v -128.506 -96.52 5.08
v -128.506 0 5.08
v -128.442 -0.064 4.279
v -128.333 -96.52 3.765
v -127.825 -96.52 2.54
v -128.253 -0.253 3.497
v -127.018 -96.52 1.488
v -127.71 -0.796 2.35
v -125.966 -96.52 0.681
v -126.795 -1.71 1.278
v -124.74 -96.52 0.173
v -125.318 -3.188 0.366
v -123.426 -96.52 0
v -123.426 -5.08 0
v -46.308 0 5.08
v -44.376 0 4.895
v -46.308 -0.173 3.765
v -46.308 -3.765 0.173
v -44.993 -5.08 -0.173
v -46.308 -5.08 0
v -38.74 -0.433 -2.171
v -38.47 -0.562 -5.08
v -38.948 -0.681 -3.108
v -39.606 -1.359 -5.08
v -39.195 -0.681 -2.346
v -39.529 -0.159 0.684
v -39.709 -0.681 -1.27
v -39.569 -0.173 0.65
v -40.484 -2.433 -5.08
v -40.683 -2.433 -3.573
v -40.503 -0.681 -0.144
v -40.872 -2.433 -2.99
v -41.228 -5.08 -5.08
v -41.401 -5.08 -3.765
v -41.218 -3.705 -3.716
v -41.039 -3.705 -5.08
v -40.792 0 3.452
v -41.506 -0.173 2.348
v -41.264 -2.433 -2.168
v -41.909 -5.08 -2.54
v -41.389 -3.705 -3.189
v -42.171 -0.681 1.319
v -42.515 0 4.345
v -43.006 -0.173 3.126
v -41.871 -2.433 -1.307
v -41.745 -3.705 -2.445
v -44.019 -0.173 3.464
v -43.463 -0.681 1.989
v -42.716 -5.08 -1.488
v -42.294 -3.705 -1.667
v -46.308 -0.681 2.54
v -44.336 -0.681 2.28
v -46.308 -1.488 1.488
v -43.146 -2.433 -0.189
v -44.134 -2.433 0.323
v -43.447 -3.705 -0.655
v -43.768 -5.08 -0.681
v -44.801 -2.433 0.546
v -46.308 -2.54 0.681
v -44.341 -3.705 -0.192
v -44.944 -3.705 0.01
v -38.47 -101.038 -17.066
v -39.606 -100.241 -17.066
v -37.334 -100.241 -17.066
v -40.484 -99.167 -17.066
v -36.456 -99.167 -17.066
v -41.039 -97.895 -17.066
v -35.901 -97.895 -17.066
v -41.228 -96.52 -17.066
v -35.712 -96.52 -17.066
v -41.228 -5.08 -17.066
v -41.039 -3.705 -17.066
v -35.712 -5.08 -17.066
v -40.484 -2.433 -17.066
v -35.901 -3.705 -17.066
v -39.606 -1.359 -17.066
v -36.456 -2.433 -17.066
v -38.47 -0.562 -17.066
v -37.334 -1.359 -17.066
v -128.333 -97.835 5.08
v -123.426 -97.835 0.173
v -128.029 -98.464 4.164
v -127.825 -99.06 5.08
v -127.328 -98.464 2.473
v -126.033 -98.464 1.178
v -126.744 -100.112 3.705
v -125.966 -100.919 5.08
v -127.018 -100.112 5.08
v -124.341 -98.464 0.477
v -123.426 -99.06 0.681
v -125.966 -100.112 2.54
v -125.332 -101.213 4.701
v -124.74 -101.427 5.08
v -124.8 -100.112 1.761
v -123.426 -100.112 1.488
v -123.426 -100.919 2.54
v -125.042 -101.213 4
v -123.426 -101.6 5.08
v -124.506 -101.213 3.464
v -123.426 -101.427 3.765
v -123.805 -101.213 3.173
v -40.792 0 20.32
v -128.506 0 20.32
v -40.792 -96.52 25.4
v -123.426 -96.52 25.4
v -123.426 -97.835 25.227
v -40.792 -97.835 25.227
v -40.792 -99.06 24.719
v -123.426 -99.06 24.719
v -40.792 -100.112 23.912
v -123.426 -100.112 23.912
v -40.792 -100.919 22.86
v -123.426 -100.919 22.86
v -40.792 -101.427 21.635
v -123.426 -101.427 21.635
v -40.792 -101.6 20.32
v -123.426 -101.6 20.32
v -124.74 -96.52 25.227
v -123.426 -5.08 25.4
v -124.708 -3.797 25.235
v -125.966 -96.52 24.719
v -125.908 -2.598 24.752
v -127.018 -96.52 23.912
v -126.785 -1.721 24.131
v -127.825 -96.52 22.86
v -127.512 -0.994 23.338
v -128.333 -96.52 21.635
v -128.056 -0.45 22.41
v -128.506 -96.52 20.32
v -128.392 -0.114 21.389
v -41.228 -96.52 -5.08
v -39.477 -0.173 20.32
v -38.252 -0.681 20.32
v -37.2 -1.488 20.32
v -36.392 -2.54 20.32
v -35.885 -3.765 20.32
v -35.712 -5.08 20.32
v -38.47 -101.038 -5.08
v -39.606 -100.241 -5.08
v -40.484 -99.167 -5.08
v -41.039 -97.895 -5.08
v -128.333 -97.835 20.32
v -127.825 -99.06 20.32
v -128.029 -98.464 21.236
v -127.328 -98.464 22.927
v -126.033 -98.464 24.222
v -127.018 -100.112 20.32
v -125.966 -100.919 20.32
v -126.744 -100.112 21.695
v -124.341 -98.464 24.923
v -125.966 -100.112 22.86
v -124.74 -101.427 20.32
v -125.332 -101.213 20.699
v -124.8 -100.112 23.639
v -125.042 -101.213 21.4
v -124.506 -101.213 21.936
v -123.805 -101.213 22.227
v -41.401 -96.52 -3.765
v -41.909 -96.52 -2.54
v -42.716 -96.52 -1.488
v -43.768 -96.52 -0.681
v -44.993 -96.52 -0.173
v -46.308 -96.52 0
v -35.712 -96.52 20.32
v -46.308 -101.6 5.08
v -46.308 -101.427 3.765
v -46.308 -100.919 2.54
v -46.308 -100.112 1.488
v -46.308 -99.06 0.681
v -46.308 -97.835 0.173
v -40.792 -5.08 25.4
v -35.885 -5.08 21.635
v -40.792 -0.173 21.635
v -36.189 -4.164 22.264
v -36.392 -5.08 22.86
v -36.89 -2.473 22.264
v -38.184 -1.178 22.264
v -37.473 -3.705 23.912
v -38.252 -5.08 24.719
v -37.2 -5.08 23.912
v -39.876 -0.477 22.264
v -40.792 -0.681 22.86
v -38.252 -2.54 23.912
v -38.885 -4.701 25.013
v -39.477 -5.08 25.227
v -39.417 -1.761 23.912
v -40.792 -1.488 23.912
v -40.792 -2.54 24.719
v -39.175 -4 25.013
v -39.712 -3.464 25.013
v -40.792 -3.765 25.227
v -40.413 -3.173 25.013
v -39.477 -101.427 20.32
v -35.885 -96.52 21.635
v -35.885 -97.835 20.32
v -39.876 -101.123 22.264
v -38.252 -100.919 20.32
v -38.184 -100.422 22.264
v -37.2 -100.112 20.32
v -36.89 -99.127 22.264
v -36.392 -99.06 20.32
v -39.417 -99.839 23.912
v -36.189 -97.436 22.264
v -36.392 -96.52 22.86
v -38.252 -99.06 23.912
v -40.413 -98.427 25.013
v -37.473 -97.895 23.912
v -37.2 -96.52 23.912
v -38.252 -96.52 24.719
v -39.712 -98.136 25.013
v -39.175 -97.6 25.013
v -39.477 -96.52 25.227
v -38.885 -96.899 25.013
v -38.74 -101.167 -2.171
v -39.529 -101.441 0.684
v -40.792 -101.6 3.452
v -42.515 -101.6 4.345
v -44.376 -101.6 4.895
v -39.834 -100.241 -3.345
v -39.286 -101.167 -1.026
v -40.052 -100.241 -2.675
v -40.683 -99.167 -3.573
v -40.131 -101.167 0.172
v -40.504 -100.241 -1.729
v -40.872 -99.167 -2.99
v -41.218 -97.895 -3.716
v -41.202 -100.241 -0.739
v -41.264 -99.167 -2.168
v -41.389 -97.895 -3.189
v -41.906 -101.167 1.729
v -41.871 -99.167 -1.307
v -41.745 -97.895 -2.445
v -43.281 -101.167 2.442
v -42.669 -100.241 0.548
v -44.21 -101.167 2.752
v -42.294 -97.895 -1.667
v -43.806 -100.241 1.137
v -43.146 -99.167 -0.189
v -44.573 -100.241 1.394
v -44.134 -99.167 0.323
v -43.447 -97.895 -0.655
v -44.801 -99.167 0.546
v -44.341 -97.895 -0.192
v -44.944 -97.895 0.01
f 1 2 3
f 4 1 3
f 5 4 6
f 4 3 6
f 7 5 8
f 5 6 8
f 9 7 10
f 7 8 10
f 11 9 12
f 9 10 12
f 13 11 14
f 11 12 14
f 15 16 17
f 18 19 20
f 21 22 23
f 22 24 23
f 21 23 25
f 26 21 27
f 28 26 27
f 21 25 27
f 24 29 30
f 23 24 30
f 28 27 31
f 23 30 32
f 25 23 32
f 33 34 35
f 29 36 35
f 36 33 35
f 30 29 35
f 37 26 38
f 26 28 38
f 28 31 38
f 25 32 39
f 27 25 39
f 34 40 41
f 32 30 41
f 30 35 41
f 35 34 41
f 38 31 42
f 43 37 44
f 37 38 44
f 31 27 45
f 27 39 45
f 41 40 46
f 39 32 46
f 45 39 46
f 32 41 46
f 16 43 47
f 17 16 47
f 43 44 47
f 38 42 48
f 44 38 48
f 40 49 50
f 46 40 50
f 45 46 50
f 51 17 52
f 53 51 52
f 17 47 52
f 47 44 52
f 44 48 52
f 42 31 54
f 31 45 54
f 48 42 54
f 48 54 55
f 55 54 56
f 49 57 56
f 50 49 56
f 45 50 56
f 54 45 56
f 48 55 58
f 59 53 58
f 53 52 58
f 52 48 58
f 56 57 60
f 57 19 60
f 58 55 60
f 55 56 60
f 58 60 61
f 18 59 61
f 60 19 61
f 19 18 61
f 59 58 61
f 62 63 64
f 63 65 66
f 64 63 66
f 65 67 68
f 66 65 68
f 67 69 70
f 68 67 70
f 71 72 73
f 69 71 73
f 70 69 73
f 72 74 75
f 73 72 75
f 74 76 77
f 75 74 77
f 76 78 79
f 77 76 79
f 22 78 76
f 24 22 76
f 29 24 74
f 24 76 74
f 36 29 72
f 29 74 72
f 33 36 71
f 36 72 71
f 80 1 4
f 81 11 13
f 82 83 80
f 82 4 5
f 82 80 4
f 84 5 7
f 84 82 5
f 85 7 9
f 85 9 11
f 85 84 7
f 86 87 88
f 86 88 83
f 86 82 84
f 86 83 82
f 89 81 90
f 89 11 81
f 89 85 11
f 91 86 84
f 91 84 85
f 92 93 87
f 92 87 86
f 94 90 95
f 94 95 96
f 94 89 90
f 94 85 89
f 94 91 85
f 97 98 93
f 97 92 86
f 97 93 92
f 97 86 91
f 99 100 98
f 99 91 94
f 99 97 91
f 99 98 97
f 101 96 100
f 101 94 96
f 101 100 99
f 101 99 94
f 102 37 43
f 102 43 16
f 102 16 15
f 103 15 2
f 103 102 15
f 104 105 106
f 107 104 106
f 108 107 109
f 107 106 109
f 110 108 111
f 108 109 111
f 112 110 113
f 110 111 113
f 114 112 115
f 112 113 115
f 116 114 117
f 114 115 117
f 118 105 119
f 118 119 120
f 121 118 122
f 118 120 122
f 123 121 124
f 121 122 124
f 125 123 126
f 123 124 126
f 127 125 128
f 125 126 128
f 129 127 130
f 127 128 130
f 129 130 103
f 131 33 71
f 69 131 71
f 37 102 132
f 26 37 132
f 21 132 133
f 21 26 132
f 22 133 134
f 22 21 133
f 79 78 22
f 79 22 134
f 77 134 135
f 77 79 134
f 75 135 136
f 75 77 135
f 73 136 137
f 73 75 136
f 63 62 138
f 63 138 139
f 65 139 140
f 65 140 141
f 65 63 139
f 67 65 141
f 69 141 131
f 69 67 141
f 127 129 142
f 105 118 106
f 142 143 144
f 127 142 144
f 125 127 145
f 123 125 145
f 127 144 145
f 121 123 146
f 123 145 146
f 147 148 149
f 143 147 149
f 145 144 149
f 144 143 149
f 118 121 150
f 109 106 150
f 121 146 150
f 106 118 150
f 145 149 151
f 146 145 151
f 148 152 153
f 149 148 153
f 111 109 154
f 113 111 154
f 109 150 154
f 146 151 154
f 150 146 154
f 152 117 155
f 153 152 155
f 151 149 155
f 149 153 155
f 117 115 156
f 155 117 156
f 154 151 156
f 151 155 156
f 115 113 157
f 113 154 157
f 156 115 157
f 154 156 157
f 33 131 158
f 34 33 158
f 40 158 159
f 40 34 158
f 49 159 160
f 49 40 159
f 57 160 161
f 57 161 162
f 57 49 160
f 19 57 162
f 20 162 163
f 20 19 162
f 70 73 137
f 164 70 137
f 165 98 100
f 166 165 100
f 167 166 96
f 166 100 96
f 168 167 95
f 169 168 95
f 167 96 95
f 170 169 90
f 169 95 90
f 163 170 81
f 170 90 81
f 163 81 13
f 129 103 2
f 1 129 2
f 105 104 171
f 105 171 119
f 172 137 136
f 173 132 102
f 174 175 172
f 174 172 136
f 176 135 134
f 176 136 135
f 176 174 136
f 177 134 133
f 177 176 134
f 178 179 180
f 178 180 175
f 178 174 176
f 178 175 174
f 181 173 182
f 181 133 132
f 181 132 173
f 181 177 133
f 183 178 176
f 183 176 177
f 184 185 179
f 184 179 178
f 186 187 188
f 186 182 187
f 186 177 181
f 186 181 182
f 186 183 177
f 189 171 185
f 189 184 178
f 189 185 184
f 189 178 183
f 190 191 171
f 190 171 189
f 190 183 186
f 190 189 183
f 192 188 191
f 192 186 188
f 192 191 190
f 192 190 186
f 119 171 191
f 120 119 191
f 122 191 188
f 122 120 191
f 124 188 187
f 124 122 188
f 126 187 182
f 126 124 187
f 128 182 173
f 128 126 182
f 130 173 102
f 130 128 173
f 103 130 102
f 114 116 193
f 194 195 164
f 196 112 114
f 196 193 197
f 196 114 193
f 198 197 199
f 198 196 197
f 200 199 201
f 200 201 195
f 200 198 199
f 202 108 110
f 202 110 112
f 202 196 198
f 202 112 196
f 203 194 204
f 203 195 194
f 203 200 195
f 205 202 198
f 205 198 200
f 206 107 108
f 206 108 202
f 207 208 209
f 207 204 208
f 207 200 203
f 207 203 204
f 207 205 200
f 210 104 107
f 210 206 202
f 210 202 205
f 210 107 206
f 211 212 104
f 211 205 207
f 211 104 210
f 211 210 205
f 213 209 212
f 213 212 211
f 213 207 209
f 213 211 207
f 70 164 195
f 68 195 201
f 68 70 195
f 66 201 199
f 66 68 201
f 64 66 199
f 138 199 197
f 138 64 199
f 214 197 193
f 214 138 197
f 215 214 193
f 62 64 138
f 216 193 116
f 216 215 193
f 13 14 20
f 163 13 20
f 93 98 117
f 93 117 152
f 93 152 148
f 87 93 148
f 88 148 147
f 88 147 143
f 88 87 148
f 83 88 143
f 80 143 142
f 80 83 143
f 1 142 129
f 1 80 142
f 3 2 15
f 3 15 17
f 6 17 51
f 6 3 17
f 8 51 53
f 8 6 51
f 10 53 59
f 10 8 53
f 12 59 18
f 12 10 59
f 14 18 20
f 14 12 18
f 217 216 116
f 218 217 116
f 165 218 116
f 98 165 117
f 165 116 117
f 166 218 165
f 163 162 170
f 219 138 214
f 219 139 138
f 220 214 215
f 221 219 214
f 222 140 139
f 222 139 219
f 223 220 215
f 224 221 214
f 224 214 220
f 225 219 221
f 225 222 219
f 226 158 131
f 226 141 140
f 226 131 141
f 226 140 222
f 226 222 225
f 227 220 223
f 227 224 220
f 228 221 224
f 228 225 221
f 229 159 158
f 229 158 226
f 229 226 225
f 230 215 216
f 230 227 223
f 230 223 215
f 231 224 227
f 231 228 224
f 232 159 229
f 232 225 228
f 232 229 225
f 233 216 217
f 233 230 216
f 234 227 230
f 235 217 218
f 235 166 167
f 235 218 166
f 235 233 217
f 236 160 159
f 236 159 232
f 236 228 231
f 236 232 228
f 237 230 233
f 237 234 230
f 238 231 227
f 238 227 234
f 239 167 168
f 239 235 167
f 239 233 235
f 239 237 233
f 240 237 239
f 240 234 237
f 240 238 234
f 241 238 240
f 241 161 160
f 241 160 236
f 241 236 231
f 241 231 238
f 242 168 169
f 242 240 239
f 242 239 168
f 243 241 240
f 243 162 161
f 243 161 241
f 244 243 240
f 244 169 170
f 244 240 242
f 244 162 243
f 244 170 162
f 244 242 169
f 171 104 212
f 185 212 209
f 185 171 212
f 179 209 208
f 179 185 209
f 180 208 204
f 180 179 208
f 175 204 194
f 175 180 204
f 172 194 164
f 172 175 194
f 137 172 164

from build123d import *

# Parameters (mm, degrees)
F1_DEPTH     = 101.6
F2_T1_DEPTH  = 101.6
F2_T3_DEPTH  = 24.6862719756
F2_T5_DEPTH  = 127
F2_T7_DEPTH  = 94.8975325807
F2_T9_DEPTH  = 67.8662719756
F2_T11_DEPTH = 109.22
F2_T13_DEPTH = 100.4137670475
F2_T15_DEPTH = 50.0862719756
F2_S19_W     = 5.1816
F2_S19_H     = 5.1816
F2_T20_DEPTH = 5.1816
F2_T24_ANGLE = 90
F2_T26_ANGLE = 90
F3_T1_DEPTH  = 82.6337670475
F3_T3_DEPTH  = 15.24
F3_S7_W      = 5.08
F3_S7_H      = 5.08
F3_T8_DEPTH  = 5.08
F3_S13_W     = 5.08
F3_S13_H     = 5.08
F3_T14_DEPTH = 5.08
F3_T18_ANGLE = 89.9999999979


# Not quite as in the source:
# - a fillet or chamfer that OpenCascade refuses, or shapes differently, is made with other operations: its cross-section is extruded or revolved along the edge and cut away or added


with BuildPart() as f1:
    # F0 (on Front) → F1 (new body)
    with BuildSketch(Plane.XZ):
        Polygon((-47.2256254691, 25.4), (-128.5056254691, 25.4), (-128.5056254691, 0), (-41.2280928884, 0), (-41.2280928884, -17.0662719756), (-35.7118584216, -17.0662719756), (-35.7118584216, 25.4), align=None)
    extrude(amount=F1_DEPTH)

    # F2: fillet of radius 5.08 on 11 edges, made by hand

    # F2_s2 → F2_t1 (join)
    with BuildSketch(Plane.XZ):
        with BuildLine():
            ThreePointArc((-41.2280928884, -5.08), (-42.71599044, -1.4878975516), (-46.3080928884, 0))
            Line((-46.3080928884, 0), (-41.2280928884, 0))
            Line((-41.2280928884, 0), (-41.2280928884, -5.08))
        make_face()
    extrude(amount=F2_T1_DEPTH)

    # F2_s4 → F2_t3 (cut)
    with BuildSketch(Plane.XY.offset(-29.7662719756)):
        with BuildLine():
            ThreePointArc((-36.1480928884, 0), (-39.7401953368, -1.4878975516), (-41.2280928884, -5.08))
            Line((-41.2280928884, -5.08), (-41.2280928884, 0))
            Line((-41.2280928884, 0), (-36.1480928884, 0))
        make_face()
        with BuildLine():
            ThreePointArc((-36.1480928884, -101.6), (-39.7401953368, -100.1121024484), (-41.2280928884, -96.52))
            Line((-41.2280928884, -96.52), (-41.2280928884, -101.6))
            Line((-41.2280928884, -101.6), (-36.1480928884, -101.6))
        make_face()
    extrude(amount=F2_T3_DEPTH, mode=Mode.SUBTRACT)

    # F2_s6 → F2_t5 (cut)
    with BuildSketch(Plane.XZ.offset(-12.7)):
        with BuildLine():
            ThreePointArc((-128.5056254691, 5.08), (-127.0177279175, 1.4878975516), (-123.4256254691, 0))
            Line((-123.4256254691, 0), (-128.5056254691, 0))
            Line((-128.5056254691, 0), (-128.5056254691, 5.08))
        make_face()
        with BuildLine():
            ThreePointArc((-123.4256254691, 25.4), (-127.0177279175, 23.9121024484), (-128.5056254691, 20.32))
            Line((-128.5056254691, 20.32), (-128.5056254691, 25.4))
            Line((-128.5056254691, 25.4), (-123.4256254691, 25.4))
        make_face()
    extrude(amount=F2_T5_DEPTH, mode=Mode.SUBTRACT)

    # F2_s8 → F2_t7 (cut)
    with BuildSketch(Plane.YZ.offset(-141.2056254691)):
        with BuildLine():
            ThreePointArc((0, 5.08), (-1.4878975516, 1.4878975516), (-5.08, 0))
            Line((-5.08, 0), (0, 0))
            Line((0, 0), (0, 5.08))
        make_face()
        with BuildLine():
            ThreePointArc((-101.6, 5.08), (-100.1121024484, 1.4878975516), (-96.52, 0))
            Line((-96.52, 0), (-101.6, 0))
            Line((-101.6, 0), (-101.6, 5.08))
        make_face()
    extrude(amount=F2_T7_DEPTH, mode=Mode.SUBTRACT)

    # F2_s10 → F2_t9 (cut)
    with BuildSketch(Plane.XY.offset(-29.7662719756)):
        with BuildLine():
            ThreePointArc((-35.7118584216, -96.52), (-37.1997559731, -100.1121024484), (-40.7918584216, -101.6))
            Line((-40.7918584216, -101.6), (-35.7118584216, -101.6))
            Line((-35.7118584216, -101.6), (-35.7118584216, -96.52))
        make_face()
    extrude(amount=F2_T9_DEPTH, mode=Mode.SUBTRACT)

    # F2_s12 → F2_t11 (cut)
    with BuildSketch(Plane.XZ.offset(5.08)):
        with BuildLine():
            ThreePointArc((-40.7918584216, 25.4), (-37.1997559731, 23.9121024484), (-35.7118584216, 20.32))
            Line((-35.7118584216, 20.32), (-35.7118584216, 25.4))
            Line((-35.7118584216, 25.4), (-40.7918584216, 25.4))
        make_face()
    extrude(amount=F2_T11_DEPTH, mode=Mode.SUBTRACT)

    # F2_s14 → F2_t13 (cut)
    with BuildSketch(Plane.YZ.offset(-141.2056254691)):
        with BuildLine():
            ThreePointArc((-5.08, 25.4), (-1.4878975516, 23.9121024484), (0, 20.32))
            Line((0, 20.32), (0, 25.4))
            Line((0, 25.4), (-5.08, 25.4))
        make_face()
    extrude(amount=F2_T13_DEPTH, mode=Mode.SUBTRACT)

    # F2_s16 → F2_t15 (cut)
    with BuildSketch(Plane.XY.offset(-29.7662719756)):
        with BuildLine():
            ThreePointArc((-40.7918584216, 0), (-37.1997559731, -1.4878975516), (-35.7118584216, -5.08))
            Line((-35.7118584216, -5.08), (-35.7118584216, 0))
            Line((-35.7118584216, 0), (-40.7918584216, 0))
        make_face()
    extrude(amount=F2_T15_DEPTH, mode=Mode.SUBTRACT)


with BuildPart() as f2_tool18:
    # F2_s19 → F2_t20 (new body)
    with BuildSketch(Plane.XY.offset(20.32)):
        with Locations((-38.2010584216, -2.4892)):
            Rectangle(F2_S19_W, F2_S19_H)
    extrude(amount=F2_T20_DEPTH)

    # F2_s21 → F2_t22 (revolve, cut)
    with BuildSketch(Plane(origin=(-40.7918584216, -5.08, 20.32), x_dir=(-0.7071067812, -0.7071067812, 0), z_dir=(-0.7071067812, 0.7071067812, 0))):
        with BuildLine():
            ThreePointArc((0, -5.08), (5.08, 0), (0, 5.08))
            Line((0, 5.08), (0, -5.08))
        make_face()
    revolve(axis=Axis((-40.7918584216, -5.08, 20.32), (0, 0, 1)), mode=Mode.SUBTRACT)


with BuildPart() as f1_1:
    add(f1.part)

    # F2_t17: cut F2_tool18
    add(f2_tool18.part, mode=Mode.SUBTRACT)

    # F2_s23 → F2_t24 (revolve, cut)
    with BuildSketch(Plane.XY.offset(-5.08)):
        with BuildLine():
            ThreePointArc((-36.1480928884, -101.6), (-39.7401953368, -100.1121024484), (-41.2280928884, -96.52))
            Line((-41.2280928884, -96.52), (-41.2280928884, -101.6))
            Line((-41.2280928884, -101.6), (-36.1480928884, -101.6))
        make_face()
    revolve(axis=Axis((-46.3080928884, -101.6, -5.08), (0, -1, 0)), revolution_arc=F2_T24_ANGLE, mode=Mode.SUBTRACT)

    # F2_s25 → F2_t26 (revolve, cut)
    with BuildSketch(Plane.XY.offset(-5.08)):
        with BuildLine():
            ThreePointArc((-36.1480928884, 0), (-39.7401953368, -1.4878975516), (-41.2280928884, -5.08))
            Line((-41.2280928884, -5.08), (-41.2280928884, 0))
            Line((-41.2280928884, 0), (-36.1480928884, 0))
        make_face()
    revolve(axis=Axis((-46.3080928884, 0, -5.08), (0, -1, 0)), revolution_arc=F2_T26_ANGLE, mode=Mode.SUBTRACT)

    # F3: fillet of radius 5.08 on 3 edges, made by hand

    # F3_s2 → F3_t1 (cut)
    with BuildSketch(Plane.YZ.offset(-123.4256254691)):
        with BuildLine():
            ThreePointArc((-96.52, 25.4), (-100.1121024484, 23.9121024484), (-101.6, 20.32))
            Line((-101.6, 20.32), (-101.6, 25.4))
            Line((-101.6, 25.4), (-96.52, 25.4))
        make_face()
    extrude(amount=F3_T1_DEPTH, mode=Mode.SUBTRACT)

    # F3_s4 → F3_t3 (cut)
    with BuildSketch(Plane.XY.offset(5.08)):
        with BuildLine():
            ThreePointArc((-123.4256254691, -101.6), (-127.0177279175, -100.1121024484), (-128.5056254691, -96.52))
            Line((-128.5056254691, -96.52), (-128.5056254691, -101.6))
            Line((-128.5056254691, -101.6), (-123.4256254691, -101.6))
        make_face()
    extrude(amount=F3_T3_DEPTH, mode=Mode.SUBTRACT)


with BuildPart() as f3_tool6:
    # F3_s7 → F3_t8 (new body)
    with BuildSketch(Plane.XZ.offset(96.52)):
        with Locations((-125.9656254691, 2.54)):
            Rectangle(F3_S7_W, F3_S7_H)
    extrude(amount=F3_T8_DEPTH)

    # F3_s9 → F3_t10 (revolve, cut)
    with BuildSketch(Plane(origin=(-123.4256254691, -96.52, 5.08), x_dir=(0.7071067812, 0, 0.7071067812), z_dir=(0.7071067812, 0, -0.7071067812))):
        with BuildLine():
            ThreePointArc((0, -5.08), (5.08, 0), (0, 5.08))
            Line((0, 5.08), (0, -5.08))
        make_face()
    revolve(axis=Axis((-123.4256254691, -96.52, 5.08), (0, -1, 0)), mode=Mode.SUBTRACT)


with BuildPart() as f1_2:
    add(f1_1.part)

    # F3_t5: cut F3_tool6
    add(f3_tool6.part, mode=Mode.SUBTRACT)


with BuildPart() as f3_tool12:
    # F3_s13 → F3_t14 (new body)
    with BuildSketch(Plane.XY.offset(20.32)):
        with Locations((-38.2518584216, -99.06)):
            Rectangle(F3_S13_W, F3_S13_H)
    extrude(amount=F3_T14_DEPTH)

    # F3_s15 → F3_t16 (revolve, cut)
    with BuildSketch(Plane(origin=(-40.7918584216, -96.52, 20.32), x_dir=(-0.7071067812, 0.7071067812, 0), z_dir=(0.7071067812, 0.7071067812, 0))):
        with BuildLine():
            ThreePointArc((0, -5.08), (5.08, 0), (0, 5.08))
            Line((0, 5.08), (0, -5.08))
        make_face()
    revolve(axis=Axis((-40.7918584216, -96.52, 20.32), (0, 0, 1)), mode=Mode.SUBTRACT)


with BuildPart() as f1_3:
    add(f1_2.part)

    # F3_t11: cut F3_tool12
    add(f3_tool12.part, mode=Mode.SUBTRACT)

    # F3_s17 → F3_t18 (revolve, cut)
    with BuildSketch(Plane.XY.offset(20.3199999999)):
        with BuildLine():
            ThreePointArc((-128.5056254691, -96.52), (-127.0177279175, -100.1121024484), (-123.4256254691, -101.6))
            Line((-123.4256254691, -101.6), (-128.5056254691, -101.6))
            Line((-128.5056254691, -101.6), (-128.5056254691, -96.52))
        make_face()
    revolve(axis=Axis((-123.425625469, -101.6, 20.3199999999), (0, 1, 0)), revolution_arc=F3_T18_ANGLE, mode=Mode.SUBTRACT)


solid = f1_3.part
